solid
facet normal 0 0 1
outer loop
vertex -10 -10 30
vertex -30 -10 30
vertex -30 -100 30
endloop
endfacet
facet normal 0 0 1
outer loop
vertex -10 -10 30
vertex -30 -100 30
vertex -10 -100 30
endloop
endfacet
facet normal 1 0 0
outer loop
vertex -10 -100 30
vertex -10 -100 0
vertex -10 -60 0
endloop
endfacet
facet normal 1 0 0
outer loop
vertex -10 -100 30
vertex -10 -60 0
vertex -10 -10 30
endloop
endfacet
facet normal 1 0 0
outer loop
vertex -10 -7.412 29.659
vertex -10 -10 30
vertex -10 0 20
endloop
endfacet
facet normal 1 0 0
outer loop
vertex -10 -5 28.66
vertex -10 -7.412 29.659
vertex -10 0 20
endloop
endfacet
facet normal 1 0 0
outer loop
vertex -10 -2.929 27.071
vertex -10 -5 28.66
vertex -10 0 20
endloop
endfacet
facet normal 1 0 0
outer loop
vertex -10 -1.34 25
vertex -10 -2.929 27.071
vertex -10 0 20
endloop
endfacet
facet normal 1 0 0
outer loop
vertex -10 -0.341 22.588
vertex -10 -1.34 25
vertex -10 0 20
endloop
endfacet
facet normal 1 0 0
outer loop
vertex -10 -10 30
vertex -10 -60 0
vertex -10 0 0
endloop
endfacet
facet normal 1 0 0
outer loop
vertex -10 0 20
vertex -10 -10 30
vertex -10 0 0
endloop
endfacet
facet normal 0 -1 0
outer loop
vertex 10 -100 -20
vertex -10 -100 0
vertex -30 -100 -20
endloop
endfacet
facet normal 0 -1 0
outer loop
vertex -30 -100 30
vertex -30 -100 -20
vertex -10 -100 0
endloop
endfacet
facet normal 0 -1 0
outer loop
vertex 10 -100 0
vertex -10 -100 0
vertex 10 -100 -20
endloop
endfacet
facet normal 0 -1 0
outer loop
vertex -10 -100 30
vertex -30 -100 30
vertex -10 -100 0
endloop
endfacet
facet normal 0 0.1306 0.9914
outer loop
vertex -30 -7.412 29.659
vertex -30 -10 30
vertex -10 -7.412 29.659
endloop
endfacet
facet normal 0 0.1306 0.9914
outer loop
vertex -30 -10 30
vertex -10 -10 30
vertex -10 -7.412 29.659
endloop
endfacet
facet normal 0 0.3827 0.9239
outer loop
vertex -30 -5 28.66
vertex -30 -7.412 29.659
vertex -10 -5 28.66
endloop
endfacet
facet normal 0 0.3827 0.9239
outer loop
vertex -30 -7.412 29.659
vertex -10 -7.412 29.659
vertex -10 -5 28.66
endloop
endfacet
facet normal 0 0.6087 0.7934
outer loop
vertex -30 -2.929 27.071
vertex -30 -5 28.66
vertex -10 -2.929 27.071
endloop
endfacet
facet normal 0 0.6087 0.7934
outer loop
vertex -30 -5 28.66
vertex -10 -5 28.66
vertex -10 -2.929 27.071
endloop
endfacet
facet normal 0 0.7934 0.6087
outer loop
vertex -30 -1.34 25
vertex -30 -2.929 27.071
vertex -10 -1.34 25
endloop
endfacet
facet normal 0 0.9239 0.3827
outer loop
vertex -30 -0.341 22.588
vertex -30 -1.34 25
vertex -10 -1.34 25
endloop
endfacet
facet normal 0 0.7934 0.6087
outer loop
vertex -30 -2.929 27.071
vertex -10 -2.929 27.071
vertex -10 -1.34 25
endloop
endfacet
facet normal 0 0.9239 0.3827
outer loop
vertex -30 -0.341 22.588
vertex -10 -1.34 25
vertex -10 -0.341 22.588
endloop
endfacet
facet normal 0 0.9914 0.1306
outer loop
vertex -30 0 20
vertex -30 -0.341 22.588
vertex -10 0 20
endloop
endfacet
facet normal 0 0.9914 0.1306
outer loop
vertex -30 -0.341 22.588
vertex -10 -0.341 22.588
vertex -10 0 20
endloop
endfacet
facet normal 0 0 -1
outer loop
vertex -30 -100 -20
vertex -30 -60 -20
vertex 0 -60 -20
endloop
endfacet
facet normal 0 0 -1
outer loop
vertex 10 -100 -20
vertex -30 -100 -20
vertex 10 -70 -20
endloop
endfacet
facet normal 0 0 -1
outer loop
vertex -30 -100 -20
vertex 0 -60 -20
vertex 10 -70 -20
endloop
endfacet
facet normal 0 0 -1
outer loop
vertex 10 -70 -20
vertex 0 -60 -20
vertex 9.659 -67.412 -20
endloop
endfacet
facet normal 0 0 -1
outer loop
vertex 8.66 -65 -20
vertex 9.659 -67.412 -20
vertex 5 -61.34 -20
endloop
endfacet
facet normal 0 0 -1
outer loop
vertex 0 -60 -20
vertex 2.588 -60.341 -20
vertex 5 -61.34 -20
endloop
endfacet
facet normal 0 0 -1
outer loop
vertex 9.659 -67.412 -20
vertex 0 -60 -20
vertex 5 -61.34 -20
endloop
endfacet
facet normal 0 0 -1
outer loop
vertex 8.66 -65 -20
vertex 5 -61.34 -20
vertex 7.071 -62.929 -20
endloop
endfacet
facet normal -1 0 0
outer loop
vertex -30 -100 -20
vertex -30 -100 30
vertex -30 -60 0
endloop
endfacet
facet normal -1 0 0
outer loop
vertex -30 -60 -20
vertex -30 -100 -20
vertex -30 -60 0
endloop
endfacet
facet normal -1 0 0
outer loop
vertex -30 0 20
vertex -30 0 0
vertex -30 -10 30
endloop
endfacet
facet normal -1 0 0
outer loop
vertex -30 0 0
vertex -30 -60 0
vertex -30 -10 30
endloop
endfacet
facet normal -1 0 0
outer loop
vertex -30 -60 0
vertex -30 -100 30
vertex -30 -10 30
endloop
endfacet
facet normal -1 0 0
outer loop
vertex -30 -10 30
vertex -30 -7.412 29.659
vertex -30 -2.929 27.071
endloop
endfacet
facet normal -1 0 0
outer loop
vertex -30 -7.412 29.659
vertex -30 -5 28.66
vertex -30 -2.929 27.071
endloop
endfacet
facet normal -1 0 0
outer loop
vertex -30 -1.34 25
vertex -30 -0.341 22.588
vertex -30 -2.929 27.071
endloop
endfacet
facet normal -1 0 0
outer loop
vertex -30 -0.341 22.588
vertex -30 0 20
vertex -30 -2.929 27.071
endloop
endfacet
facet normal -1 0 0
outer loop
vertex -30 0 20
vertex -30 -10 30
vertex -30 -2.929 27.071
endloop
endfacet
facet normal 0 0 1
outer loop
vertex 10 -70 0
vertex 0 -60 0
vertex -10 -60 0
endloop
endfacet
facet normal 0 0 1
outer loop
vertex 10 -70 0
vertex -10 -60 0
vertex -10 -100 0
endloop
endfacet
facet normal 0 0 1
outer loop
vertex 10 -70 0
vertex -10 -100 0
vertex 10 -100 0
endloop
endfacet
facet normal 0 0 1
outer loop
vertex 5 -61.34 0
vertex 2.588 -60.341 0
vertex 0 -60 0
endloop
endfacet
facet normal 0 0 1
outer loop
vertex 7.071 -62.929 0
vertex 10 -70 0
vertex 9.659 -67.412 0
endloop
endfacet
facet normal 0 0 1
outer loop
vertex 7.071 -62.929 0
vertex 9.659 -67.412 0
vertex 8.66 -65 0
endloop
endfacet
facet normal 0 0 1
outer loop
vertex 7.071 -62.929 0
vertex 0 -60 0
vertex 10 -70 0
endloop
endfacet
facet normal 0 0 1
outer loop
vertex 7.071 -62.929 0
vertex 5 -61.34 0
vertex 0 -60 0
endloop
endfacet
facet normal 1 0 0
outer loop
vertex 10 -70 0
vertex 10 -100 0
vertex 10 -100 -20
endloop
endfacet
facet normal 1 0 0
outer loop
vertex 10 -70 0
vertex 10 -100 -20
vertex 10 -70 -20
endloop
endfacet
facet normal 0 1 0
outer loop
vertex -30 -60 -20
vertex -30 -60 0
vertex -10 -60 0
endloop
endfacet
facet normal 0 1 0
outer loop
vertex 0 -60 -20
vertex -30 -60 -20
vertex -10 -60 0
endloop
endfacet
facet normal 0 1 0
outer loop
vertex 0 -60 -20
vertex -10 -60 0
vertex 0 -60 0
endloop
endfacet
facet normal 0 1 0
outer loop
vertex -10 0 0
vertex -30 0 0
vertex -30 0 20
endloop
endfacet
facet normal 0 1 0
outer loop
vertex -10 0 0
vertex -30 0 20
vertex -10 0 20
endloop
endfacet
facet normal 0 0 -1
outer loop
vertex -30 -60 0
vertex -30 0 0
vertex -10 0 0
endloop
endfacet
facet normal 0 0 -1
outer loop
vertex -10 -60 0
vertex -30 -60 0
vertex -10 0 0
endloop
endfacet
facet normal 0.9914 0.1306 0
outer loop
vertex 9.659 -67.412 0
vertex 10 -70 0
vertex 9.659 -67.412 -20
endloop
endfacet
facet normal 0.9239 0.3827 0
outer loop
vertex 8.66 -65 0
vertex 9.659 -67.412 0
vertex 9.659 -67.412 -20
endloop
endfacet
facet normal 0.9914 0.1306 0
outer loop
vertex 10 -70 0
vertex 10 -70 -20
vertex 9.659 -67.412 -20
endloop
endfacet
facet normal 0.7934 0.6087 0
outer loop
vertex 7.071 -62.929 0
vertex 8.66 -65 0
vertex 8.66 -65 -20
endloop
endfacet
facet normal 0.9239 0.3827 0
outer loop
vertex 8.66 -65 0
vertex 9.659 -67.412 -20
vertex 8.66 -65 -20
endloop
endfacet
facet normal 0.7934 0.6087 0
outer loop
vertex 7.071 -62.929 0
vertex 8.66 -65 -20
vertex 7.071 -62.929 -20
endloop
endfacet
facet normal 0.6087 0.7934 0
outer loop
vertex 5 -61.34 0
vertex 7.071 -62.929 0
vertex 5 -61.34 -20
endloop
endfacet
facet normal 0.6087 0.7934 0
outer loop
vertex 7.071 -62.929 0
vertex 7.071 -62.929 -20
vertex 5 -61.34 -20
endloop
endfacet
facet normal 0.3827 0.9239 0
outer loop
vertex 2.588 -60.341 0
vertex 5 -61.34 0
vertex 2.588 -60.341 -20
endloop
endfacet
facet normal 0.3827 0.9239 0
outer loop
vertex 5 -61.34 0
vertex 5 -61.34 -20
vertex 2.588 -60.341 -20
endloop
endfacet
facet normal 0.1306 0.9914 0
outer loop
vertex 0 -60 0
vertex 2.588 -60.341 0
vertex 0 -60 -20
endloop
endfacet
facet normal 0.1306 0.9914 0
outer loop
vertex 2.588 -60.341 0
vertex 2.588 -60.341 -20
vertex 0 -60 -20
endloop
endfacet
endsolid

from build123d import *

# Parameters (mm, degrees)
SKETCH1_W           = 20
SKETCH1_H           = 100
BOSS_EXTRUDE1_DEPTH = 30
SKETCH2_W           = 40
SKETCH2_H           = 40
BOSS_EXTRUDE2_DEPTH = 20
FILLET1_R           = 10


with BuildPart() as part:
    # Sketch1 → Boss-Extrude1 (new body)
    with BuildSketch(Plane.XY):
        with Locations((-20, -50)):
            Rectangle(SKETCH1_W, SKETCH1_H)
    extrude(amount=BOSS_EXTRUDE1_DEPTH)

    # Sketch2 → Boss-Extrude2 (add)
    with BuildSketch(Plane.XY):
        with Locations((-10, -80)):
            Rectangle(SKETCH2_W, SKETCH2_H)
    extrude(amount=-BOSS_EXTRUDE2_DEPTH)

    # Fillet1
    fillet1_edges = [part.edges().sort_by_distance(p)[0] for p in [
        (10, -60, -10),
        (-20, 0, 30),
    ]]
    fillet(fillet1_edges, radius=FILLET1_R)


solid = part.part
